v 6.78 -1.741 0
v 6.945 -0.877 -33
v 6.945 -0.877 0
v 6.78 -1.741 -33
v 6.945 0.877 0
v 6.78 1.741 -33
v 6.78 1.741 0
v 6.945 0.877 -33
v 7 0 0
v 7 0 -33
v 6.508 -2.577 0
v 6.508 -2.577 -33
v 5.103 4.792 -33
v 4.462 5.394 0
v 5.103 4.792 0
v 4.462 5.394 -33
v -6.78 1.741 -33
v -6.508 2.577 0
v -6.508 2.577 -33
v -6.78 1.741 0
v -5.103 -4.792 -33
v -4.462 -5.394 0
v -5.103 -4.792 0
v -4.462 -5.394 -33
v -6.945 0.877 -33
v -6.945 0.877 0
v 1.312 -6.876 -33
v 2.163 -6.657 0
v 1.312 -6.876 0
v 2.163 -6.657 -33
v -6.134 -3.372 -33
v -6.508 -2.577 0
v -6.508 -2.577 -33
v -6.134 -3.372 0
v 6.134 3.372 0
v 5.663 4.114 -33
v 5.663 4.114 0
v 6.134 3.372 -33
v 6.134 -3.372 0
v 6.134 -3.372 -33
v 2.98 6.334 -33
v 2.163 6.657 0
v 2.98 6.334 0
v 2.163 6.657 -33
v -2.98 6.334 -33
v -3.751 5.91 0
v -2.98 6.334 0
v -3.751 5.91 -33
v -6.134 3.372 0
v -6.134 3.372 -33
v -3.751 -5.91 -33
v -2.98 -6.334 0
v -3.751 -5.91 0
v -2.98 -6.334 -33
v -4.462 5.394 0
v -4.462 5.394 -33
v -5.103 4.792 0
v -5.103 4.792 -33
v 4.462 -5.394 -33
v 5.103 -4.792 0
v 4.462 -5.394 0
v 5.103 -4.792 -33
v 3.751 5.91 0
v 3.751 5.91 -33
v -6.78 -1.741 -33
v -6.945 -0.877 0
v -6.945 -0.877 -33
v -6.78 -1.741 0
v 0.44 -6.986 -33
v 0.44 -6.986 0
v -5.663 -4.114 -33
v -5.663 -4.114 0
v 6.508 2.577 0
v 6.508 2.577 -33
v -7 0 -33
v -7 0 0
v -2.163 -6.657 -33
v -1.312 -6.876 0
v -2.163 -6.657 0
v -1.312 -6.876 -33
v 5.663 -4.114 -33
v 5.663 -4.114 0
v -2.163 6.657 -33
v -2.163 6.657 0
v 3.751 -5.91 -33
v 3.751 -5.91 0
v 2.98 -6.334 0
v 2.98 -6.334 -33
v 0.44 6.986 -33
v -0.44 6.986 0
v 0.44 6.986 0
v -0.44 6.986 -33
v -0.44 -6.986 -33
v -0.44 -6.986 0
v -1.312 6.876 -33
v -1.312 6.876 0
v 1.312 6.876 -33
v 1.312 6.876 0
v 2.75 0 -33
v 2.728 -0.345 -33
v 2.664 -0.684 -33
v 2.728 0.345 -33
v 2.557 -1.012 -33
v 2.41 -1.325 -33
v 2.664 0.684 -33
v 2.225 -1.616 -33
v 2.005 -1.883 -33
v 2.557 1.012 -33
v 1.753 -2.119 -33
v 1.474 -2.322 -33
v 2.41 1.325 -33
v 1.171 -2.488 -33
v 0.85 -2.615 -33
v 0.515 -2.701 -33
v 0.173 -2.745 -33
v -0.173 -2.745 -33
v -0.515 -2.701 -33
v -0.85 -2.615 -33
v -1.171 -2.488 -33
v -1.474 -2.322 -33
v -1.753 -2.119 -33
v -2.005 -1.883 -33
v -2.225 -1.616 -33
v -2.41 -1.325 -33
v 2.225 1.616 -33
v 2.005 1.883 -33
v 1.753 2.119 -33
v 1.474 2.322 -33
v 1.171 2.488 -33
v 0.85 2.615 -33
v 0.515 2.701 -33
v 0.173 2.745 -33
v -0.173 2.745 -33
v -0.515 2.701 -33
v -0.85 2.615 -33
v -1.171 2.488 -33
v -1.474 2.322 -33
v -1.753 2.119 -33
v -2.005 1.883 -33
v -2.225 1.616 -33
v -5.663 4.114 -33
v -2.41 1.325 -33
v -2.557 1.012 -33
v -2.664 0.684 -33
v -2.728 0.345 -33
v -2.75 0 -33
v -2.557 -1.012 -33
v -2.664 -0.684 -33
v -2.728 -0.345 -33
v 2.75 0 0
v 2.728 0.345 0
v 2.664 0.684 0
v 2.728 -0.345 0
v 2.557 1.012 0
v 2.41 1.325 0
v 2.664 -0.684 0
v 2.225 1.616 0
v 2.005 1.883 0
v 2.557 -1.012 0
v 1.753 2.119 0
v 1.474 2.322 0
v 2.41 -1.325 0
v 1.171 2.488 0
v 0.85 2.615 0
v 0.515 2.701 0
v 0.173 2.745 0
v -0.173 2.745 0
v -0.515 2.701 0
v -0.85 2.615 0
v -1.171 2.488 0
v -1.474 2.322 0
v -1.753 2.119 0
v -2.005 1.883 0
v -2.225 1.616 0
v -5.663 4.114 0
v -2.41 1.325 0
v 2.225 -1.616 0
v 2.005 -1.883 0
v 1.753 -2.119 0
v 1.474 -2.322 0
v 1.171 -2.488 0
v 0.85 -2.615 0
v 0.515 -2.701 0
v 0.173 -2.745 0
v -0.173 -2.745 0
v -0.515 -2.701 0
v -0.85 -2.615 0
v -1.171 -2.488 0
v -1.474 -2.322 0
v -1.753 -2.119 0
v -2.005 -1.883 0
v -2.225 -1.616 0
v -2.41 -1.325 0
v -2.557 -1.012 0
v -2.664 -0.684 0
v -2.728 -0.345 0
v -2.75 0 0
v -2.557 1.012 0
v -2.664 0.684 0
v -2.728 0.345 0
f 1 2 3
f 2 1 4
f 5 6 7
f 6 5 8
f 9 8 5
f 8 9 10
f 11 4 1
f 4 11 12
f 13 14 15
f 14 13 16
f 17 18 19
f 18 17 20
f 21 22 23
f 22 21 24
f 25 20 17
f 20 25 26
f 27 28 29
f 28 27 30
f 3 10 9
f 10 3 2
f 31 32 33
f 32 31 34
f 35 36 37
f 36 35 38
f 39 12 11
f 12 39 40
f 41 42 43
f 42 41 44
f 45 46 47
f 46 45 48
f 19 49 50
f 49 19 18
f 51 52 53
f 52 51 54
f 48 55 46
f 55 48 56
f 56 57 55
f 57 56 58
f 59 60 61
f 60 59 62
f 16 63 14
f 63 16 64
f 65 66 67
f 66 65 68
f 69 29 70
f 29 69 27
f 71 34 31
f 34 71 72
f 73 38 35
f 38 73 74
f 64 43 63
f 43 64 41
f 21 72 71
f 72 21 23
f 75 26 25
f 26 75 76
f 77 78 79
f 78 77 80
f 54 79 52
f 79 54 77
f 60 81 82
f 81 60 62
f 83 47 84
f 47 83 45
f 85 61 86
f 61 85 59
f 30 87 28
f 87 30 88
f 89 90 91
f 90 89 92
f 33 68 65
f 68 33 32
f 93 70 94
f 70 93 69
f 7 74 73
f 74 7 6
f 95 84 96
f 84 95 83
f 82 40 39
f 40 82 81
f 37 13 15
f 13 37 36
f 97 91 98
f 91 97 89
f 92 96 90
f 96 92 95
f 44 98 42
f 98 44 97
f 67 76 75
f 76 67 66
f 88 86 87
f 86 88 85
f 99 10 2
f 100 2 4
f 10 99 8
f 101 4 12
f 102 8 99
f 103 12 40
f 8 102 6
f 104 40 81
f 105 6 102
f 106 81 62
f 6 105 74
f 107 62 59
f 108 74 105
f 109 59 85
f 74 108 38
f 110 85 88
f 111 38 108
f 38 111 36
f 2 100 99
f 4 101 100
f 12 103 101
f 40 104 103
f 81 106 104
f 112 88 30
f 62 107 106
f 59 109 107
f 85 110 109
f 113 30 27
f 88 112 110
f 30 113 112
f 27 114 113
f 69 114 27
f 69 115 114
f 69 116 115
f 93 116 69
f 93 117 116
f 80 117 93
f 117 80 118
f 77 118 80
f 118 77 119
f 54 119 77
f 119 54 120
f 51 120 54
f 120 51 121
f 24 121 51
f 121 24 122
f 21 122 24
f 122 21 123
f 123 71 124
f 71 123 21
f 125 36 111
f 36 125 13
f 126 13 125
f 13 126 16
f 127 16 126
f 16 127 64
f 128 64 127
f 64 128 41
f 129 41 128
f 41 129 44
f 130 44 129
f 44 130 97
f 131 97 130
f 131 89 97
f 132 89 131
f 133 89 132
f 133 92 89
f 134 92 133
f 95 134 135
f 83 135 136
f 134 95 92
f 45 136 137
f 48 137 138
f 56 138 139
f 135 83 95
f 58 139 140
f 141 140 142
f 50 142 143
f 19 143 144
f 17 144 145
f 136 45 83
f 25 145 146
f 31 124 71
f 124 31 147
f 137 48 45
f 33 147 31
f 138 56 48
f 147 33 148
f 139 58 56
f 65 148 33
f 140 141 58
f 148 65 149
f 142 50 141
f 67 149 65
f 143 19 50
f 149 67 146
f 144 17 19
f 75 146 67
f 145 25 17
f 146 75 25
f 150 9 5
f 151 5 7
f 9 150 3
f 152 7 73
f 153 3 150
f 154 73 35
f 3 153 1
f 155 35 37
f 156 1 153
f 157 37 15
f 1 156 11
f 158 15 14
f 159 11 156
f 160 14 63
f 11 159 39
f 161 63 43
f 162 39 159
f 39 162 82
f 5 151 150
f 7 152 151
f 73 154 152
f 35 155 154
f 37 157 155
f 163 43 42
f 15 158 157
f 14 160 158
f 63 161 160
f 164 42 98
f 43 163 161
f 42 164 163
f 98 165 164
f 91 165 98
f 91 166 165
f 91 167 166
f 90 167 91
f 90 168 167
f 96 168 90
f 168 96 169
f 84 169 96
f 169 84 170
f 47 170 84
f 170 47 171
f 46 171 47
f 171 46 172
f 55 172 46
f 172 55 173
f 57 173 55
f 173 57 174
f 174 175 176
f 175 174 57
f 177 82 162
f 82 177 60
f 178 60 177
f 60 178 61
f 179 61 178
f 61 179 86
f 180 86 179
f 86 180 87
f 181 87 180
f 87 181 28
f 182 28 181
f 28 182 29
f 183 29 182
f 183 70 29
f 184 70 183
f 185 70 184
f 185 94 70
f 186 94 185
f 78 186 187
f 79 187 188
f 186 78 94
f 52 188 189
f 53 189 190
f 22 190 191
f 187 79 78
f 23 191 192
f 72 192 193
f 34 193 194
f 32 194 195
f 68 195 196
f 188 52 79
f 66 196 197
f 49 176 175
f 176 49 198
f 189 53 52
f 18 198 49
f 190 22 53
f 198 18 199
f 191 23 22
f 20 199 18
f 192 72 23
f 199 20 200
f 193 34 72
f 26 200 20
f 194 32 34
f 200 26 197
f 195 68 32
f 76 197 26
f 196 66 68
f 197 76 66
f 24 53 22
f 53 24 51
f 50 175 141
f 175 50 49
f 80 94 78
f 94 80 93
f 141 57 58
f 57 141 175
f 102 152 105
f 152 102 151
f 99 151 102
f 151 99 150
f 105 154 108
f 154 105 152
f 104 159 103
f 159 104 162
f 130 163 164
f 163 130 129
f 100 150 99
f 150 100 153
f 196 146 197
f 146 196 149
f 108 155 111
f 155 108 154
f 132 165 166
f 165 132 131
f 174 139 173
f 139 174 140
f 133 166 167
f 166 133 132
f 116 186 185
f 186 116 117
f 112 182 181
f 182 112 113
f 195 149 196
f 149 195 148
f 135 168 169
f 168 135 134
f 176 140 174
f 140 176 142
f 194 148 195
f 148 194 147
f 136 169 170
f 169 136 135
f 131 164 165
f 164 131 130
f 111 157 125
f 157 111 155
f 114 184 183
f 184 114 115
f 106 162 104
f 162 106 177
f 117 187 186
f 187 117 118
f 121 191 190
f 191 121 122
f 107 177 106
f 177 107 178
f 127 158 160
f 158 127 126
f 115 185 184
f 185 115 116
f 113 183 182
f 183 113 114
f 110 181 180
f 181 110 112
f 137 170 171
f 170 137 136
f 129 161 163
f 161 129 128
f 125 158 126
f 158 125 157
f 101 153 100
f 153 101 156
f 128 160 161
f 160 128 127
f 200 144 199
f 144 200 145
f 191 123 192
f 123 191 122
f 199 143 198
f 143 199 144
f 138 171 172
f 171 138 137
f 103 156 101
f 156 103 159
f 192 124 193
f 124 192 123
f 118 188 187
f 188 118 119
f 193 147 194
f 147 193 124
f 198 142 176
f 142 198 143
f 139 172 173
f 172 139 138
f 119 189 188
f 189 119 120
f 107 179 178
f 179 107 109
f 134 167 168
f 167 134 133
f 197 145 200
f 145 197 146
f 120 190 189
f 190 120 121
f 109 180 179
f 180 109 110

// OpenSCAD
$fn = 50;


difference() {
	union() {
		translate(v = [0, 0, -33.0000000000]) {
			cylinder(h = 33, r = 7.0000000000);
		}
		cylinder(h = 0, r = 10.0000000000);
	}
	union() {
		#translate(v = [0, 0, -33]) {
			cylinder(h = 33, r = 2.7500000000);
		}
	}
}
